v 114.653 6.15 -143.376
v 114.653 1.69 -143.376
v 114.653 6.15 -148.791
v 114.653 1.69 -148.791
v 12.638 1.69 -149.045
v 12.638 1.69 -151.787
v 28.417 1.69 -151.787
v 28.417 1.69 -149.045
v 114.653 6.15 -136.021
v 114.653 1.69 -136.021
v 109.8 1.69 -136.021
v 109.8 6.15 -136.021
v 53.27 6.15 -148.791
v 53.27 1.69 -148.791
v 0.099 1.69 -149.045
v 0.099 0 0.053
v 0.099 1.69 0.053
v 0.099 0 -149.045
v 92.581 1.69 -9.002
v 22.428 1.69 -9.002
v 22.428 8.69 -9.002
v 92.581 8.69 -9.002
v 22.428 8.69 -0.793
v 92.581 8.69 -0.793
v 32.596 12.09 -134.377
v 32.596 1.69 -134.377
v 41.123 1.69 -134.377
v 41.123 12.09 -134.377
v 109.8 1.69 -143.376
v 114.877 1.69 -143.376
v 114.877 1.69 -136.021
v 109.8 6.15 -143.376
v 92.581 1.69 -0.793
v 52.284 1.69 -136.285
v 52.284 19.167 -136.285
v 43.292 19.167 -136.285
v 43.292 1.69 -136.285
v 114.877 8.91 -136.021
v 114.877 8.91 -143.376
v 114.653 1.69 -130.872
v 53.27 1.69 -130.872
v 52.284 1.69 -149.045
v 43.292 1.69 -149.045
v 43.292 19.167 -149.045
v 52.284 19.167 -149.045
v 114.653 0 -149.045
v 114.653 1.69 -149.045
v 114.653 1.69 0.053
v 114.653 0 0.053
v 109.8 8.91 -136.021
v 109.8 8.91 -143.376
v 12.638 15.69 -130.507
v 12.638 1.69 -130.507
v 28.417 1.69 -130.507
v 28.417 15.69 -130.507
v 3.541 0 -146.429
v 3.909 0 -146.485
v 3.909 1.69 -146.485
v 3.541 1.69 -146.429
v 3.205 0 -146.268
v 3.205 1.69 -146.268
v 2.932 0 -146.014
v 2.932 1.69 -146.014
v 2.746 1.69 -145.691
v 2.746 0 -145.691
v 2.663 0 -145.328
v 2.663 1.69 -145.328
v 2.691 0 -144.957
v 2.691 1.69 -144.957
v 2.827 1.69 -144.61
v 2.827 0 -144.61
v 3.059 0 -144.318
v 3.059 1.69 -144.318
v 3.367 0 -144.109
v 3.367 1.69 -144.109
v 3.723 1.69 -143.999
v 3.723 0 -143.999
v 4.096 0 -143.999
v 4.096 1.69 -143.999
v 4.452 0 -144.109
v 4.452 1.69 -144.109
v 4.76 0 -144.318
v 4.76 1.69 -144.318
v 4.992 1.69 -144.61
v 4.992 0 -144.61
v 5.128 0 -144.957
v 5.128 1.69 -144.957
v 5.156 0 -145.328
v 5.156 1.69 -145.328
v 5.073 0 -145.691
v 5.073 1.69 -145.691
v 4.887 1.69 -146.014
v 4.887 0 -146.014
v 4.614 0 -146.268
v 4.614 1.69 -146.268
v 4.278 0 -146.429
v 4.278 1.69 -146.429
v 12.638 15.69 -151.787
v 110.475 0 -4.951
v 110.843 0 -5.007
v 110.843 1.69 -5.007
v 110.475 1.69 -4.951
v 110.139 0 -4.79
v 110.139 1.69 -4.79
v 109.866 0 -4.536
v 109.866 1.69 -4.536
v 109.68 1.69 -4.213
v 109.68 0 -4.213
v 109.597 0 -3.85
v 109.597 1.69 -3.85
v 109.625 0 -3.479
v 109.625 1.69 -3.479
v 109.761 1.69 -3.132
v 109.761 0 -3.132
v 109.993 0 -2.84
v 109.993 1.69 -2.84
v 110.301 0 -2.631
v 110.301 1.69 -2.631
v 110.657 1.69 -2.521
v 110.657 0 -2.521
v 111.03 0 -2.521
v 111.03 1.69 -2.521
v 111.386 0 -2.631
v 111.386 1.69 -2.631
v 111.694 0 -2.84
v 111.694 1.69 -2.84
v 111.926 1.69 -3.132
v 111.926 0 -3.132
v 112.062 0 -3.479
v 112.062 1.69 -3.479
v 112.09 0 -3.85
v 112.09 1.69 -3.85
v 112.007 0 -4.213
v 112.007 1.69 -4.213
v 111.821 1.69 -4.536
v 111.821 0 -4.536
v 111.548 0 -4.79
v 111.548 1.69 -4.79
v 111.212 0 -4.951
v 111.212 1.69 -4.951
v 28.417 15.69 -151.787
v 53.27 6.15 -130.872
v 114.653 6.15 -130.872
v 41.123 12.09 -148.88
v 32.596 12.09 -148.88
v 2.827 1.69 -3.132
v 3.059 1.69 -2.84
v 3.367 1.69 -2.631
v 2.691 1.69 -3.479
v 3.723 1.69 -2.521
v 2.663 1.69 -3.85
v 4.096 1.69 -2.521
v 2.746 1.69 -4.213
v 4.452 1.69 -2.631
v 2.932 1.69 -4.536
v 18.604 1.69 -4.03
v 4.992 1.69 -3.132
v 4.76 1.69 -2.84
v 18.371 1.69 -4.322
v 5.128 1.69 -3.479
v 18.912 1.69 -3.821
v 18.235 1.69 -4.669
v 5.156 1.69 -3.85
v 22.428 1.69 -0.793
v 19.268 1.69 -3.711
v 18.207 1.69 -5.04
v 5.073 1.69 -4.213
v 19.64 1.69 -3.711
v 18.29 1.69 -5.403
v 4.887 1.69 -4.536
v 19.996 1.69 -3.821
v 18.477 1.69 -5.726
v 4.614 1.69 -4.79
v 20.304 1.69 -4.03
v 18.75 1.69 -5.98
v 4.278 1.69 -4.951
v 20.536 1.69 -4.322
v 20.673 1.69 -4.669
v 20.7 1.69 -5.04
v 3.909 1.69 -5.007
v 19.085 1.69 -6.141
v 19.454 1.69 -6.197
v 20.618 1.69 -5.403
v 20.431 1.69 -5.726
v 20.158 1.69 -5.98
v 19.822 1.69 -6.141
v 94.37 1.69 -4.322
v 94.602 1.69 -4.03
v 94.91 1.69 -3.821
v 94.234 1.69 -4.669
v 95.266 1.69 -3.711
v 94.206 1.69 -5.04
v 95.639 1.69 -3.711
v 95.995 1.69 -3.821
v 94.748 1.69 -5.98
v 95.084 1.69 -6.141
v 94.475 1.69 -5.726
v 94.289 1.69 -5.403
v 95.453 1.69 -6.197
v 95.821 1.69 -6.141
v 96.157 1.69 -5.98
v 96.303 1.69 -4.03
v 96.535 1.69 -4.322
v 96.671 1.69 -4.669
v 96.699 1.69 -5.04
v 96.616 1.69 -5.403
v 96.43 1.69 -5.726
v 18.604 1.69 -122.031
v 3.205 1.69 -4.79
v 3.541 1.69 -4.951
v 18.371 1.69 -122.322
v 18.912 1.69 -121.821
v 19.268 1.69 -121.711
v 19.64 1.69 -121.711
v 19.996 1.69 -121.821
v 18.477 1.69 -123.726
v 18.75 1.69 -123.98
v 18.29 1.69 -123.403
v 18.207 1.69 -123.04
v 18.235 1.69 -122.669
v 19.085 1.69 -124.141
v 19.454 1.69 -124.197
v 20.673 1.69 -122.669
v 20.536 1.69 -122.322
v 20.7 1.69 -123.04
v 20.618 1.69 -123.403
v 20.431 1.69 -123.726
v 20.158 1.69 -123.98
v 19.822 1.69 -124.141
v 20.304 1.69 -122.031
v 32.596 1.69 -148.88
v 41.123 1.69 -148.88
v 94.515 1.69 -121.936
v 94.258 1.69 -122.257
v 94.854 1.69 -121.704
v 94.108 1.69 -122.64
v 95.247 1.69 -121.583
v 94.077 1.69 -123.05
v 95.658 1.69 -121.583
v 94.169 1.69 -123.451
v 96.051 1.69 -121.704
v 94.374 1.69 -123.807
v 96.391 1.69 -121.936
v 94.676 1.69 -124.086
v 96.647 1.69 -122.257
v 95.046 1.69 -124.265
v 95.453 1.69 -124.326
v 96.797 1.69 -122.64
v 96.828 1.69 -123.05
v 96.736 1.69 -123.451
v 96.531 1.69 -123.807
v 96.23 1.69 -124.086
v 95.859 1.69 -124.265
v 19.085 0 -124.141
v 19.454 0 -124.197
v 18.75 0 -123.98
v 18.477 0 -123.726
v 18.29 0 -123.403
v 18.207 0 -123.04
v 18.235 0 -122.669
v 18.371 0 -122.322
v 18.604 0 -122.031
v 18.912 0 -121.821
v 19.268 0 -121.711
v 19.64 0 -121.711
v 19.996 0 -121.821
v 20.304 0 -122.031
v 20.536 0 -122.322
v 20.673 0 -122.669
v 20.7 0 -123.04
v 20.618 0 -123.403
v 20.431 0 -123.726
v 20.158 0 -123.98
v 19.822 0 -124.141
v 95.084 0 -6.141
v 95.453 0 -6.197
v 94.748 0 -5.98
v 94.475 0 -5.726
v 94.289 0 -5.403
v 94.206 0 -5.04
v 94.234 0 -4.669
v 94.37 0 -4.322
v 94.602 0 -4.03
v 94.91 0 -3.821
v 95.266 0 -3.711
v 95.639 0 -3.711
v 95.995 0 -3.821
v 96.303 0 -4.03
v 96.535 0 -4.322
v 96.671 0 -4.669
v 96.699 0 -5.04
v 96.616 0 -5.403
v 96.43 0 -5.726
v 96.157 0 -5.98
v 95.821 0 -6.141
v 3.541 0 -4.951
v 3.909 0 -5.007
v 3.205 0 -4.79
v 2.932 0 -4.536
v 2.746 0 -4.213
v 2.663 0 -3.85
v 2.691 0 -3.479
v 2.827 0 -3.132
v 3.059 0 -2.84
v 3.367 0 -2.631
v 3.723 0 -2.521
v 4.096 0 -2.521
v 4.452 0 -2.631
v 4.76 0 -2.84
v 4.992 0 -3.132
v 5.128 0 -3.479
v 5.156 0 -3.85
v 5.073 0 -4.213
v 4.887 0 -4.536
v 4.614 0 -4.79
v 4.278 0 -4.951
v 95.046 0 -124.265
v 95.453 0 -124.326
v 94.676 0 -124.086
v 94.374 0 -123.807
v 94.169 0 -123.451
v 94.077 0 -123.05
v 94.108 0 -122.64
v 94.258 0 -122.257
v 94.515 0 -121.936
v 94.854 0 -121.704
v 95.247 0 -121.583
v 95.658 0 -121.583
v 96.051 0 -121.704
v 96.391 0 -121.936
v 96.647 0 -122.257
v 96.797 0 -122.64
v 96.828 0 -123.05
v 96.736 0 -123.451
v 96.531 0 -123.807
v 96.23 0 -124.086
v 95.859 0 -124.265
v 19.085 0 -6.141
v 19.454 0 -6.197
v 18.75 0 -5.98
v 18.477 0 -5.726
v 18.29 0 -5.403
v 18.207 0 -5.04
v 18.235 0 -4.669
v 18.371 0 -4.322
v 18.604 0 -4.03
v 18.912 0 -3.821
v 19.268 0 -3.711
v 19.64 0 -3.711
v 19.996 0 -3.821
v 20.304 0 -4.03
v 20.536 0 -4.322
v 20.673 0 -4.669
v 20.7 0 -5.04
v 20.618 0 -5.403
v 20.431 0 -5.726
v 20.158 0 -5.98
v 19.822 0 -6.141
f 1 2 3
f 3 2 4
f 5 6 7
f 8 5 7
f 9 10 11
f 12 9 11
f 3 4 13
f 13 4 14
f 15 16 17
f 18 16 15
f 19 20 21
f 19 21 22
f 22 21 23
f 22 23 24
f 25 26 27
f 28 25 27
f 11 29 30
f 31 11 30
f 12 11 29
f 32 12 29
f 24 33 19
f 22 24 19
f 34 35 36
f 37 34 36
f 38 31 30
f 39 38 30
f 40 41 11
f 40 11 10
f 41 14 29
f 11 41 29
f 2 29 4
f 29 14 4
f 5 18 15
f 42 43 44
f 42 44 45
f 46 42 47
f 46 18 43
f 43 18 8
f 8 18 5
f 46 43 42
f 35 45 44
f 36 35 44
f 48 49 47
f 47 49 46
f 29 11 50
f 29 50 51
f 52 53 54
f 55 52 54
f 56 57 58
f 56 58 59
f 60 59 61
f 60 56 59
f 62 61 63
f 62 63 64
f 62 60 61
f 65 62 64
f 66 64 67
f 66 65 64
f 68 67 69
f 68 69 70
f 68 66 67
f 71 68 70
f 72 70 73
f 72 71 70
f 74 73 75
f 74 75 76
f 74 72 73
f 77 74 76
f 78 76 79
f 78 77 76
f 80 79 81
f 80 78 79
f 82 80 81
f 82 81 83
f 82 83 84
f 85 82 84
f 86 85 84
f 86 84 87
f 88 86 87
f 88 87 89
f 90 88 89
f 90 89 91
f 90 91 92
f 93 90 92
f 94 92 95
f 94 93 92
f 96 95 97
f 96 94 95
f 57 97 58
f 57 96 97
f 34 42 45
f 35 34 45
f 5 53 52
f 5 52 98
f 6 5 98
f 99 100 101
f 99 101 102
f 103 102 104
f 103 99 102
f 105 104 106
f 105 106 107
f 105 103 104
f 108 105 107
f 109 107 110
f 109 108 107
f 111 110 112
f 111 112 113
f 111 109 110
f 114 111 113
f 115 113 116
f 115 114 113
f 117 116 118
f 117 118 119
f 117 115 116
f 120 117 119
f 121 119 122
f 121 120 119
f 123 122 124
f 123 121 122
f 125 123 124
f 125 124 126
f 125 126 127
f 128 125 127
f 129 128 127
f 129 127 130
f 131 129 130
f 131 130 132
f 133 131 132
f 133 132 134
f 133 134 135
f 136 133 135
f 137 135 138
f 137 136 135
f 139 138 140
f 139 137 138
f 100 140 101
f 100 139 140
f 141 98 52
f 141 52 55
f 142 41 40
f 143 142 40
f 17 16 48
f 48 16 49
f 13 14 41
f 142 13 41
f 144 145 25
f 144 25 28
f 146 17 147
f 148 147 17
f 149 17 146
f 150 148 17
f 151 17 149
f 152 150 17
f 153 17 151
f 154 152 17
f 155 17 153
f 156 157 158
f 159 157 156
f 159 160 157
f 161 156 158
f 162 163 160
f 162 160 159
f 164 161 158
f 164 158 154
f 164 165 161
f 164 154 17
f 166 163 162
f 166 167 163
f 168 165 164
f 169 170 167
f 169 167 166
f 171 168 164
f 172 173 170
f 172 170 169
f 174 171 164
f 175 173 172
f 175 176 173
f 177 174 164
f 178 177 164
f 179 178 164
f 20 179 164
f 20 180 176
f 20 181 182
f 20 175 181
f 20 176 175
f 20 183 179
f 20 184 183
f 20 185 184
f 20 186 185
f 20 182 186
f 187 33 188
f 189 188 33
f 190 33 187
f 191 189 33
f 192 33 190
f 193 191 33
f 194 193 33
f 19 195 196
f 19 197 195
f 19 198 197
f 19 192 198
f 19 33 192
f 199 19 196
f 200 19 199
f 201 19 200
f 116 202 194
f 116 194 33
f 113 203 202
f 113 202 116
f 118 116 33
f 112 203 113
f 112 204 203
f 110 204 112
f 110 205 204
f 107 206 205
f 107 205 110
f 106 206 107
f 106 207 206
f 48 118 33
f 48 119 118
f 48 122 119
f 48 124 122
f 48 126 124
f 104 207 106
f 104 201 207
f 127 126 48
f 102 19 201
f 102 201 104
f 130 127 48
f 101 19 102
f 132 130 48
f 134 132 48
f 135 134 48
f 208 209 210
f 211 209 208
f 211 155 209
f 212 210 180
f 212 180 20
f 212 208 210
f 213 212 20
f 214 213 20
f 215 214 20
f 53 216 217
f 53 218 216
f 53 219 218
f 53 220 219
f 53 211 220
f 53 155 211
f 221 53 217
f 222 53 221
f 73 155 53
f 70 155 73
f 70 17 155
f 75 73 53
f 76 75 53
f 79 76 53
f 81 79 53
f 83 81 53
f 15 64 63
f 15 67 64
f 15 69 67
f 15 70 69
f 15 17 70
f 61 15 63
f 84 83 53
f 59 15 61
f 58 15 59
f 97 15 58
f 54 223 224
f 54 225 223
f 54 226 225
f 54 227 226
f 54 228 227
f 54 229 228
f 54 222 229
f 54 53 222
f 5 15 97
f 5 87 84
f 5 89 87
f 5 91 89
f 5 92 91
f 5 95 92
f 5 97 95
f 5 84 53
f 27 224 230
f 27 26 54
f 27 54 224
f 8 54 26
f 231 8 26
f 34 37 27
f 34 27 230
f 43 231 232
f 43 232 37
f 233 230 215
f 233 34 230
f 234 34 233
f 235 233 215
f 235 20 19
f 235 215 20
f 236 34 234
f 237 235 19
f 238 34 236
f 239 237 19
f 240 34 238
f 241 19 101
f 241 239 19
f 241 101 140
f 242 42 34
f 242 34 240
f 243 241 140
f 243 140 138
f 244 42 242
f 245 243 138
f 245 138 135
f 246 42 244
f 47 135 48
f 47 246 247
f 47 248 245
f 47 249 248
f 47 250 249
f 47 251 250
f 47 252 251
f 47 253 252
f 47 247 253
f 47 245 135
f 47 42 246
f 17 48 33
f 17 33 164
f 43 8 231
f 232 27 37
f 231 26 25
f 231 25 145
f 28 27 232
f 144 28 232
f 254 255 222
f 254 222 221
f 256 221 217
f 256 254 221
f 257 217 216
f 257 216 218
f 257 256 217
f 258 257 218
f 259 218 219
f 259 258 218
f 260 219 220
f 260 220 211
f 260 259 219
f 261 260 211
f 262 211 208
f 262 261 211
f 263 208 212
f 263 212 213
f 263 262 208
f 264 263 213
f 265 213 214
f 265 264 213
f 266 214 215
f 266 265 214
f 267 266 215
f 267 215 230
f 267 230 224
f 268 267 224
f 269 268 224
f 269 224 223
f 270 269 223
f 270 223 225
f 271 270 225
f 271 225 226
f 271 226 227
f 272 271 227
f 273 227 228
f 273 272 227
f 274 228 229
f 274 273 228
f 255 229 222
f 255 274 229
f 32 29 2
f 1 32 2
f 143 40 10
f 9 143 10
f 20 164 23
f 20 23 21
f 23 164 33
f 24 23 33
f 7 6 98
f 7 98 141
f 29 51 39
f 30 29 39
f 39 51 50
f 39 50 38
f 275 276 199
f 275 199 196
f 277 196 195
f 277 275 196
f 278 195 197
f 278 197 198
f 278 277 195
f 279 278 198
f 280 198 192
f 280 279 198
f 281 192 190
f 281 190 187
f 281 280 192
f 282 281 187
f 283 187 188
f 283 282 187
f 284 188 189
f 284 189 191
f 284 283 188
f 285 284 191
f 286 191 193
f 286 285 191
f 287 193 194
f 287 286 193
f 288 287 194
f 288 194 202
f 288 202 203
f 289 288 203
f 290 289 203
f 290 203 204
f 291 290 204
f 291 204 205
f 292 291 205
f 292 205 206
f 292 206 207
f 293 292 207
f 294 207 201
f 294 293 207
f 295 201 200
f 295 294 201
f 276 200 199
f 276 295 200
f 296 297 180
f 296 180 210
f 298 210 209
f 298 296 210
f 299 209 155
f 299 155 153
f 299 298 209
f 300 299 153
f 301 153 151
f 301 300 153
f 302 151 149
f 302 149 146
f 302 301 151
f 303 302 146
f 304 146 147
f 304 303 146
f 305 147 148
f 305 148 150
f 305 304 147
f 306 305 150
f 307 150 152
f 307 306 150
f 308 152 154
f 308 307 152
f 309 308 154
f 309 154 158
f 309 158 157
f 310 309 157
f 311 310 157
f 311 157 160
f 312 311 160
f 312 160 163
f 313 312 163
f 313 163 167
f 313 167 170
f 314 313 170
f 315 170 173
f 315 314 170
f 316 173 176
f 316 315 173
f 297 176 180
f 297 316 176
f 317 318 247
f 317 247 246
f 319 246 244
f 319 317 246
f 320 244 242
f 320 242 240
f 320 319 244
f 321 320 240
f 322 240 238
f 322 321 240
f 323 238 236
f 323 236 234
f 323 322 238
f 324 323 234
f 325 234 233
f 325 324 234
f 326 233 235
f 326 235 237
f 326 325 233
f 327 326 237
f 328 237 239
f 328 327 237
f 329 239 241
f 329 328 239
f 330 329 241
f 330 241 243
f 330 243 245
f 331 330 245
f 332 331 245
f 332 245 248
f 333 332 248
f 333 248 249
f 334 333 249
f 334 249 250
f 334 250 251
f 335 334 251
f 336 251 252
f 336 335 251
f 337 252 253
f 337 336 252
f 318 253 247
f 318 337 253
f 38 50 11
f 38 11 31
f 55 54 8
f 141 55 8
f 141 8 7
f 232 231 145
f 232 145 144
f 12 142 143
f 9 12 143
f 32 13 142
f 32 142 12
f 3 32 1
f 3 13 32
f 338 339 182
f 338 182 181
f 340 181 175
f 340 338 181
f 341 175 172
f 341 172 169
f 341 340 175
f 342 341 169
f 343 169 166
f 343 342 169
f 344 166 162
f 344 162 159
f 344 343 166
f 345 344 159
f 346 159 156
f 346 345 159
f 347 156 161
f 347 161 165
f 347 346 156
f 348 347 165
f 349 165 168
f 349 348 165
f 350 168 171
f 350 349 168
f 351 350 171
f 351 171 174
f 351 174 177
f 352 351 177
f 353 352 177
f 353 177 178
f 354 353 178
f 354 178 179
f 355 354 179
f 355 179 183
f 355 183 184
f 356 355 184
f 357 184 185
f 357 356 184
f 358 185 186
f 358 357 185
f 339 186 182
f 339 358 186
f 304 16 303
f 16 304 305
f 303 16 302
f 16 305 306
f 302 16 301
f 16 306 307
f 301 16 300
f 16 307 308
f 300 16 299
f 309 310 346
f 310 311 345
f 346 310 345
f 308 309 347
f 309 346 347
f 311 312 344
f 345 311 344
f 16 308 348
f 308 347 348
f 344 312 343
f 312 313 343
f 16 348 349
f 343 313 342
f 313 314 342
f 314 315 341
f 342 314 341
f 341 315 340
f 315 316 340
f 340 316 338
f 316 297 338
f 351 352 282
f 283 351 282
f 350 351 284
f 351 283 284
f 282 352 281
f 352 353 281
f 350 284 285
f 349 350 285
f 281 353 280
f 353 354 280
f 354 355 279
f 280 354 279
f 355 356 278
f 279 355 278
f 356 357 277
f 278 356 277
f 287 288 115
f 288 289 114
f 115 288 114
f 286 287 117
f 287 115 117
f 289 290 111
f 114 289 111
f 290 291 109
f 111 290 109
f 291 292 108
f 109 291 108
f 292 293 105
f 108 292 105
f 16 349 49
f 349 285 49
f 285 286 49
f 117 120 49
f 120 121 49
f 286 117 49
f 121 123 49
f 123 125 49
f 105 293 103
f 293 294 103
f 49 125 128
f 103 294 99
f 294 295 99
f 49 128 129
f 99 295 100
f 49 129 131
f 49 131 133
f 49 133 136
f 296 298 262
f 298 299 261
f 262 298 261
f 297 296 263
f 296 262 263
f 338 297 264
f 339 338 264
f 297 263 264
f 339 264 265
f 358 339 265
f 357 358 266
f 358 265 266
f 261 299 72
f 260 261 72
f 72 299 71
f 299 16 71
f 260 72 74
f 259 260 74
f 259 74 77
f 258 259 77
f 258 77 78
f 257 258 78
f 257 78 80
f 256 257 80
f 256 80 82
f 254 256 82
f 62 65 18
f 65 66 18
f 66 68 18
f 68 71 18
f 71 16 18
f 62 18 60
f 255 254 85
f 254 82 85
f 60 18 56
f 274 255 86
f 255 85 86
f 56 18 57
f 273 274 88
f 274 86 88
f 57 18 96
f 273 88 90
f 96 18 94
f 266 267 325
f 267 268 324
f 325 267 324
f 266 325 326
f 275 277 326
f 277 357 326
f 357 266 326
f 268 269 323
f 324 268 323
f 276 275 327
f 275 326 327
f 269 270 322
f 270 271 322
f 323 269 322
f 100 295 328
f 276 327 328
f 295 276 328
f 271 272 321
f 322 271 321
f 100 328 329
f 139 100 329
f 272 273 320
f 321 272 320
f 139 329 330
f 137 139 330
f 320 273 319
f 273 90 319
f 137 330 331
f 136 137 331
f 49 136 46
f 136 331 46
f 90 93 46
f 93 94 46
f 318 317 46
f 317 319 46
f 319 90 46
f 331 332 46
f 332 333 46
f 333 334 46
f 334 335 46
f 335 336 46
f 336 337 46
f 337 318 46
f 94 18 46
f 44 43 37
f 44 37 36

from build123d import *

# Parameters (mm, degrees)
SKETCH1_W           = 114.55401
SKETCH1_H           = 149.09799
SKETCH1_R           = 1.249995
SKETCH1_R_2         = 1.37919162
BOSS_EXTRUDE1_DEPTH = 1.69
SKETCH2_W           = 15.779027005
SKETCH2_H           = 21.279879663
BOSS_EXTRUDE2_DEPTH = 14
SKETCH2_3_W         = 70.152219837
SKETCH2_3_H         = 8.208296776
BOSS_EXTRUDE3_DEPTH = 7
SKETCH2_4_W         = 8.526889658
SKETCH2_4_H         = 14.502739447
BOSS_EXTRUDE4_DEPTH = 10.4
BOSS_EXTRUDE5_DEPTH = 4.46
SKETCH2_6_W         = 5.077021517
SKETCH2_6_H         = 7.355
BOSS_EXTRUDE6_DEPTH = 7.22
SKETCH3_W           = 8.992
SKETCH3_H           = 17.501
BOSS_EXTRUDE7_DEPTH = 12.76


with BuildPart() as part:
    # Sketch1 → Boss-Extrude1 (new body)
    with BuildSketch(Plane(origin=(0, 0, 0), x_dir=(1, 0, 0), z_dir=(0, 1, 0))):
        with Locations((57.376465546, 74.495783937)):
            Rectangle(SKETCH1_W, SKETCH1_H)
        with Locations((3.909460546, 145.234788937)):
            Circle(SKETCH1_R, mode=Mode.SUBTRACT)
        with Locations((19.453930546, 122.946818937)):
            Circle(SKETCH1_R, mode=Mode.SUBTRACT)
        with Locations((95.452630546, 122.946818937)):
            Circle(SKETCH1_R_2, mode=Mode.SUBTRACT)
        with Locations((3.909460546, 3.756788937)):
            Circle(SKETCH1_R, mode=Mode.SUBTRACT)
        with Locations((19.453930546, 4.946808937)):
            Circle(SKETCH1_R, mode=Mode.SUBTRACT)
        with Locations((95.452630546, 4.946808937)):
            Circle(SKETCH1_R, mode=Mode.SUBTRACT)
        with Locations((110.843460546, 3.756788937)):
            Circle(SKETCH1_R, mode=Mode.SUBTRACT)
    extrude(amount=BOSS_EXTRUDE1_DEPTH)

    # Sketch2 → Boss-Extrude2 (add)
    with BuildSketch(Plane(origin=(0, 1.69, 0), x_dir=(1, 0, 0), z_dir=(0, 1, 0))):
        with Locations((20.527770766, 141.147336322)):
            Rectangle(SKETCH2_W, SKETCH2_H)
    extrude(amount=BOSS_EXTRUDE2_DEPTH)

    # Sketch2<3> → Boss-Extrude3 (add)
    with BuildSketch(Plane(origin=(0, 1.69, 0), x_dir=(1, 0, 0), z_dir=(0, 1, 0))):
        with Locations((57.504496967, 4.897528339)):
            Rectangle(SKETCH2_3_W, SKETCH2_3_H)
    extrude(amount=BOSS_EXTRUDE3_DEPTH)

    # Sketch2<4> → Boss-Extrude4 (add)
    with BuildSketch(Plane(origin=(0, 1.69, 0), x_dir=(1, 0, 0), z_dir=(0, 1, 0))):
        with Locations((36.859301714, 141.628157004)):
            Rectangle(SKETCH2_4_W, SKETCH2_4_H)
    extrude(amount=BOSS_EXTRUDE4_DEPTH)

    # Sketch3 → Boss-Extrude7 (add)
    with BuildSketch(Plane(origin=(0, 0, -149.044778937), x_dir=(-1, 0, 0), z_dir=(0, 0, -1))):
        with Locations((-47.788258207, 10.416744921)):
            Rectangle(SKETCH3_W, SKETCH3_H)
    extrude(amount=-BOSS_EXTRUDE7_DEPTH)


with BuildPart() as body_2:
    # Sketch2<5> → Boss-Extrude5 (new body)
    with BuildSketch(Plane(origin=(0, 1.69, 0), x_dir=(1, 0, 0), z_dir=(0, 1, 0))):
        Polygon((53.270056885, 130.871941106), (114.653216885, 130.871941106), (114.653216885, 136.020576727), (109.800056884, 136.020576727), (109.800056884, 143.375576727), (114.653216885, 143.375576727), (114.653216885, 148.790576727), (53.270056885, 148.790576727), align=None)
    extrude(amount=BOSS_EXTRUDE5_DEPTH)


with BuildPart() as body_3:
    # Sketch2<6> → Boss-Extrude6 (new body)
    with BuildSketch(Plane(origin=(0, 1.69, 0), x_dir=(1, 0, 0), z_dir=(0, 1, 0))):
        with Locations((112.338567643, 139.698076727)):
            Rectangle(SKETCH2_6_W, SKETCH2_6_H)
    extrude(amount=BOSS_EXTRUDE6_DEPTH)


solid = Compound([part.part, body_2.part, body_3.part])
